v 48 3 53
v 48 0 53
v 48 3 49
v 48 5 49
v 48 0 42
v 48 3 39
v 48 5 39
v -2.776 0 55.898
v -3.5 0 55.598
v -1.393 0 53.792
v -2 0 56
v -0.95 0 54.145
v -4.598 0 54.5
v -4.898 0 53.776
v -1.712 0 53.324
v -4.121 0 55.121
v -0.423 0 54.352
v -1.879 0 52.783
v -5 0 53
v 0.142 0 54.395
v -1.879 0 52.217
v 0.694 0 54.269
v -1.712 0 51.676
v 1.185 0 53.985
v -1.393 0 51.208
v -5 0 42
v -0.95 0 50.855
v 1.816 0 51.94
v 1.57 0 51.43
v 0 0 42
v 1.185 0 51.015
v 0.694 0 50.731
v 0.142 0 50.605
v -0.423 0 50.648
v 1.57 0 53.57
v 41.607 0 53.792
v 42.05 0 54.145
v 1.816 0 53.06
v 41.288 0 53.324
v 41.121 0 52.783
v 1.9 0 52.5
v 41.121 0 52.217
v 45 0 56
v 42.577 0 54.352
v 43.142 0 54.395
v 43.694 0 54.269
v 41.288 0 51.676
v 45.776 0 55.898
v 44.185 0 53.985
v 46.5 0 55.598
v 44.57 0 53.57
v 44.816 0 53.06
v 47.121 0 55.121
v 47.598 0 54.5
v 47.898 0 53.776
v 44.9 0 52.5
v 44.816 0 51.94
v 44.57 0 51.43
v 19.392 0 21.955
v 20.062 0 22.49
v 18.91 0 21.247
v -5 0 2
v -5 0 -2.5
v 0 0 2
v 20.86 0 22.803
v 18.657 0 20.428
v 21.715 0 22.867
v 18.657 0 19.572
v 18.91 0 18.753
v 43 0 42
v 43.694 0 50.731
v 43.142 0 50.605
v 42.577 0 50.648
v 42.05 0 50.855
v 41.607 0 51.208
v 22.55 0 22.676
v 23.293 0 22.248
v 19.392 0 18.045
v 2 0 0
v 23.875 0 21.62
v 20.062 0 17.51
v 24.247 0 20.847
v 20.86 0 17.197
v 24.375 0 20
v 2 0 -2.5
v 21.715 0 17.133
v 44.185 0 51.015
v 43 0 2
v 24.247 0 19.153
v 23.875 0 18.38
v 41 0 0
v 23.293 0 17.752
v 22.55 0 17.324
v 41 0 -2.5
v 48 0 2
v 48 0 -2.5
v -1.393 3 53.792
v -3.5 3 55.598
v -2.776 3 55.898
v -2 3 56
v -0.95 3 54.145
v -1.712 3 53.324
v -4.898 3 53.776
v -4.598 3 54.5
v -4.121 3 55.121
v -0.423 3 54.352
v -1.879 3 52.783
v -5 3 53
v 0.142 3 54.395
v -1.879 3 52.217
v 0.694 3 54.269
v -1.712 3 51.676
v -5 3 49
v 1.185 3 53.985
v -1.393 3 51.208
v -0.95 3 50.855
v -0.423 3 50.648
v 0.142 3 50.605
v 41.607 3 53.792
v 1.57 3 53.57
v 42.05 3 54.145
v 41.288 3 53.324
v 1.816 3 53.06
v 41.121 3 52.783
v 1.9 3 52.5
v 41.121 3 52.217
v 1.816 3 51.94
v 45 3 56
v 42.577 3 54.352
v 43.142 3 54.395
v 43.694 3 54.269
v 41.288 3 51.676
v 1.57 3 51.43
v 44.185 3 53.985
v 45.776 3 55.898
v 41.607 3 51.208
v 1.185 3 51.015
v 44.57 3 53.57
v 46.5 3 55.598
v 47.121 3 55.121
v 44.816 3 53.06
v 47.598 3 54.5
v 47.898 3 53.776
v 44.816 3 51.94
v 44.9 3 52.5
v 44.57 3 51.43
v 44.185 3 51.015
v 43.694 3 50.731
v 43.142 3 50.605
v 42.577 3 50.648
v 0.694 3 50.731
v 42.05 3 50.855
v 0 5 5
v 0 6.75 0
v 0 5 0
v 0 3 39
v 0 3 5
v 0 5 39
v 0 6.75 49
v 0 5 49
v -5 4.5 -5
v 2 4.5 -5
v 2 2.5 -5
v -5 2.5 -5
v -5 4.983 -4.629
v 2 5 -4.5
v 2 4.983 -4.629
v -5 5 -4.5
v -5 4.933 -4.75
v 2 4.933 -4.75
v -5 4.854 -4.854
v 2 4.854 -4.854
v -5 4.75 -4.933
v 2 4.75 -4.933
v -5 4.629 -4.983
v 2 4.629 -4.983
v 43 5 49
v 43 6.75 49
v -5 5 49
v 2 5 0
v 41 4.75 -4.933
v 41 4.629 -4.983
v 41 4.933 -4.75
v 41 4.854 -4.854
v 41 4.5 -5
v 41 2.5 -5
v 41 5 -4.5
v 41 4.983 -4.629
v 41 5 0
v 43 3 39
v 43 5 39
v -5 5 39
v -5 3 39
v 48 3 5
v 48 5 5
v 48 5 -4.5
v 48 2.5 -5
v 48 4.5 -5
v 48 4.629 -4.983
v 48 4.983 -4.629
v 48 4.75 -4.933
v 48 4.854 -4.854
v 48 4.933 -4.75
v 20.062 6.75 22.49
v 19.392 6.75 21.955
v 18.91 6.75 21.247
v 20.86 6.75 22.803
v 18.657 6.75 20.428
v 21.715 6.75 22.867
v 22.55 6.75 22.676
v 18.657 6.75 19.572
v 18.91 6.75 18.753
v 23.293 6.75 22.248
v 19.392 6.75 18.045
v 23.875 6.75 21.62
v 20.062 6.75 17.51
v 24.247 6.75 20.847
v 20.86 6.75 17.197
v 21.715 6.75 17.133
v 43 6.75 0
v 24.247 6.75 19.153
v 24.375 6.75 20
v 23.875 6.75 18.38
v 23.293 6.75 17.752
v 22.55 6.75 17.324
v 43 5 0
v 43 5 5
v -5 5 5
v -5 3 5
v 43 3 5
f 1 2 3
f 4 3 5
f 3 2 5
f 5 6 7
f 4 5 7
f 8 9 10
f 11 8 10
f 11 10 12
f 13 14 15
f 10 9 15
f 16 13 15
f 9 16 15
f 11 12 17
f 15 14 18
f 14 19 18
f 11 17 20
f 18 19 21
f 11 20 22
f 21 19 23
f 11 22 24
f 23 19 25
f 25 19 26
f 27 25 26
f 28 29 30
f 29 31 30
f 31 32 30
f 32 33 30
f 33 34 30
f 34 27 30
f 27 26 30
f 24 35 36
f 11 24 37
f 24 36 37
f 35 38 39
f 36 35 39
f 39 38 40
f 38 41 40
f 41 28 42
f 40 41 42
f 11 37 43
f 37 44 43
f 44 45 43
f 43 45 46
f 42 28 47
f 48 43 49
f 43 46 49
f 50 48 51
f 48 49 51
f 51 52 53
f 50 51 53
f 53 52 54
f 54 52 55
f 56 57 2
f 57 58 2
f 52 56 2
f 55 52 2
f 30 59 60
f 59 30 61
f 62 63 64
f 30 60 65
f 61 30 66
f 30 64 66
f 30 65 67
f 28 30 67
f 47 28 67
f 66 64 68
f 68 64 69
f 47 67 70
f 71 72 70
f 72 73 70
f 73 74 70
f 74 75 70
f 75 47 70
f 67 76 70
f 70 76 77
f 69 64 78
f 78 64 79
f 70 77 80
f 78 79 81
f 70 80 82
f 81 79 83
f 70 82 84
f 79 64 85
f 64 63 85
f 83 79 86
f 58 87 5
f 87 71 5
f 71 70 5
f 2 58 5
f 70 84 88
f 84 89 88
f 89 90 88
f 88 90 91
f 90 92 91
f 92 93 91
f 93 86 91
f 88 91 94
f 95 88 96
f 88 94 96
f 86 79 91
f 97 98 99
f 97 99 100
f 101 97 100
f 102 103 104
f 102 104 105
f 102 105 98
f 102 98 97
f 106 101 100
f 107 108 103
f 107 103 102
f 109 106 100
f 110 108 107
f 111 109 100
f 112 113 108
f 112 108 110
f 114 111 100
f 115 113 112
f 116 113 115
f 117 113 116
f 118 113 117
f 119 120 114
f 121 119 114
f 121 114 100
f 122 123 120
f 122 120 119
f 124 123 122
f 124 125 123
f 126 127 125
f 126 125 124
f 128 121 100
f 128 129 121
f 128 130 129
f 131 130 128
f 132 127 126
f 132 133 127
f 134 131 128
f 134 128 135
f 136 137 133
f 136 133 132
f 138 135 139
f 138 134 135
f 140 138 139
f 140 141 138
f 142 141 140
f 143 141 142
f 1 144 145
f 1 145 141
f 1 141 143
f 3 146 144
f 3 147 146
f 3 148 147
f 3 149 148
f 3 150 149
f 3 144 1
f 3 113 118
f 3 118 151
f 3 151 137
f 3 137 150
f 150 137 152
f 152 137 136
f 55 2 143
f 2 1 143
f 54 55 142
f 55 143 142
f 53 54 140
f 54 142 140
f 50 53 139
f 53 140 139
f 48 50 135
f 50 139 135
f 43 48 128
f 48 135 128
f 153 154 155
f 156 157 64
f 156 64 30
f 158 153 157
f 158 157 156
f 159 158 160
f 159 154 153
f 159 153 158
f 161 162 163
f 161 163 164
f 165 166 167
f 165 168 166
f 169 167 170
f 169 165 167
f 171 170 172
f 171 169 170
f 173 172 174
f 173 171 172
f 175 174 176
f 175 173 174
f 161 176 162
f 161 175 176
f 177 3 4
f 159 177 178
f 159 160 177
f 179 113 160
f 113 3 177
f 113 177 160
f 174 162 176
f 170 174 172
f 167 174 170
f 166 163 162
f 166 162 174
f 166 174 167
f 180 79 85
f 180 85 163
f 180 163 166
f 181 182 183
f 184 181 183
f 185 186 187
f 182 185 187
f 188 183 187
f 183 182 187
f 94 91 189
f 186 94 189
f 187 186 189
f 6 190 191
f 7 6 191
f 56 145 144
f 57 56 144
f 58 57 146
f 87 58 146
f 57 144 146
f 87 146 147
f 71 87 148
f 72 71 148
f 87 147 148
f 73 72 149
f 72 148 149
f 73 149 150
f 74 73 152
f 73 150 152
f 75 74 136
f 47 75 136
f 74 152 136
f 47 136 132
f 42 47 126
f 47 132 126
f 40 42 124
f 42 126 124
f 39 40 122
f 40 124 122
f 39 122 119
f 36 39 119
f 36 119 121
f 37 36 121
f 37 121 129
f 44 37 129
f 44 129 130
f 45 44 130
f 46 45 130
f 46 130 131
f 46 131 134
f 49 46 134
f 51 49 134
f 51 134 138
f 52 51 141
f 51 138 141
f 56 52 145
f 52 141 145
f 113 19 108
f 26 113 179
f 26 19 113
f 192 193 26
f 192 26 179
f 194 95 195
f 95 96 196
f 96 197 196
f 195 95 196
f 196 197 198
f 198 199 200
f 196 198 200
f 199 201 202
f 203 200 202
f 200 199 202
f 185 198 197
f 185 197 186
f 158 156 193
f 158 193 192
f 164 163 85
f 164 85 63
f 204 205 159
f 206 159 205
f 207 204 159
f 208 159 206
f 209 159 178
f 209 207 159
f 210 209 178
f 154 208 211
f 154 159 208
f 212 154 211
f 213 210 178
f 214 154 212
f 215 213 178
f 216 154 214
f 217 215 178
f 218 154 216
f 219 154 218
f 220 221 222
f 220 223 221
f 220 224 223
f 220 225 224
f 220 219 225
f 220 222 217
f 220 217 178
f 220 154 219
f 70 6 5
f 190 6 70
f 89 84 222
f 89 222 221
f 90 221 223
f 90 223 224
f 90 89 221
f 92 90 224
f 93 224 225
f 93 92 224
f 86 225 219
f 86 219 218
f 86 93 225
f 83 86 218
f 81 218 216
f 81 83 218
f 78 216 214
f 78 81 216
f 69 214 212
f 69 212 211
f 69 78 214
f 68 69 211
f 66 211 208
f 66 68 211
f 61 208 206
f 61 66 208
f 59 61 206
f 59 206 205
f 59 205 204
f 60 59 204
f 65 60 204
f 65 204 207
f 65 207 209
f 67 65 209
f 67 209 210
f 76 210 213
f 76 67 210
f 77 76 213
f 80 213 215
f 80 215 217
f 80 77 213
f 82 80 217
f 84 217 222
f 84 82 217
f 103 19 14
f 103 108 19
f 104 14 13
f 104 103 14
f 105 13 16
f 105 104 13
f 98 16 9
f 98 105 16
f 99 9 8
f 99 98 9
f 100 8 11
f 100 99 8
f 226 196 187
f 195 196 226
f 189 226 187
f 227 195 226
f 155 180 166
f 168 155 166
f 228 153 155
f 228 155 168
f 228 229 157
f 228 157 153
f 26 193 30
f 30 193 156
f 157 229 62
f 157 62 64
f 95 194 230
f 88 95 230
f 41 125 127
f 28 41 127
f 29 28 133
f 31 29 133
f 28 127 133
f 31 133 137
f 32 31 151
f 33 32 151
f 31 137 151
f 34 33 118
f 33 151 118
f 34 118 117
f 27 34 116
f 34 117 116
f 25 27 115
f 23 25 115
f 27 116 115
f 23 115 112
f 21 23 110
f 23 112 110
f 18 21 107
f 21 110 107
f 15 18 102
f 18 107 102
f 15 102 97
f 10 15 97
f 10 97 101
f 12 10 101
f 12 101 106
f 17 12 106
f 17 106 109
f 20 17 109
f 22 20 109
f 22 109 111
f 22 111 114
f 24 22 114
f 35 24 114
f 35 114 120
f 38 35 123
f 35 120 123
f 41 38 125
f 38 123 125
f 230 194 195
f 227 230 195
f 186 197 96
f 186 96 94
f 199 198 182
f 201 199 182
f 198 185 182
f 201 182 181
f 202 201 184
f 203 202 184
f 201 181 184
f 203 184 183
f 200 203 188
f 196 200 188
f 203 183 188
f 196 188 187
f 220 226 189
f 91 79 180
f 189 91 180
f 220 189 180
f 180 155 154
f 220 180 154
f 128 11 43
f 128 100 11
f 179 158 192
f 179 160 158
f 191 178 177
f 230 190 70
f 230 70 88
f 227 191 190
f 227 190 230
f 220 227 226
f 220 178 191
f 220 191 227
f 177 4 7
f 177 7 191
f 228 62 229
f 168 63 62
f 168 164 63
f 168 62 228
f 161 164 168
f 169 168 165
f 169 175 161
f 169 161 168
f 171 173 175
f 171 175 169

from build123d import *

# Parameters (mm, degrees)
SKETCH1_W           = 43
SKETCH1_H           = 49
SKETCH1_R           = 2.875
BOSS_EXTRUDE1_DEPTH = 6.75
SKETCH2_W           = 49
SKETCH2_H           = 5
BOSS_EXTRUDE2_DEPTH = 5
SKETCH3_W           = 49
SKETCH3_H           = 5
BOSS_EXTRUDE3_DEPTH = 5
SKETCH4_W           = 7
SKETCH4_H           = 5
BOSS_EXTRUDE4_DEPTH = 5
CHAMFER1_SIZE       = 2.5
FILLET1_R           = 0.5
SKETCH6_W           = 53
SKETCH6_H           = 3
BOSS_EXTRUDE6_DEPTH = 7
SKETCH7_R           = 1.9
CUT_EXTRUDE1_DEPTH  = 3
SKETCH9_W           = 34
SKETCH9_H           = 5
CUT_EXTRUDE2_DEPTH  = 5
SKETCH10_W          = 34
SKETCH10_H          = 5
CUT_EXTRUDE3_DEPTH  = 5
CHAMFER2_SIZE       = 3
FILLET2_R           = 3


with BuildPart() as part:
    # Sketch1 → Boss-Extrude1 (new body)
    with BuildSketch(Plane(origin=(0, 0, 0), x_dir=(1, 0, 0), z_dir=(0, 1, 0))):
        with Locations((21.5, -24.5)):
            Rectangle(SKETCH1_W, SKETCH1_H)
        with Locations((21.5, -20)):
            Circle(SKETCH1_R, mode=Mode.SUBTRACT)
    extrude(amount=BOSS_EXTRUDE1_DEPTH)

    # Sketch2 → Boss-Extrude2 (add)
    with BuildSketch(Plane.ZY):
        with Locations((24.5, 2.5)):
            Rectangle(SKETCH2_W, SKETCH2_H)
    extrude(amount=BOSS_EXTRUDE2_DEPTH)

    # Sketch3 → Boss-Extrude3 (add)
    with BuildSketch(Plane(origin=(43, 0, 0), x_dir=(0, 0, -1), z_dir=(1, 0, 0))):
        with Locations((-24.5, 2.5)):
            Rectangle(SKETCH3_W, SKETCH3_H)
    extrude(amount=BOSS_EXTRUDE3_DEPTH)

    # Sketch4 → Boss-Extrude4 (add)
    with BuildSketch(Plane(origin=(0, 0, 0), x_dir=(-1, 0, 0), z_dir=(0, 0, -1))):
        with Locations((-44.5, 2.5)):
            Rectangle(SKETCH4_W, SKETCH4_H)
        with Locations((1.5, 2.5)):
            Rectangle(SKETCH4_W, SKETCH4_H)
    extrude(amount=BOSS_EXTRUDE4_DEPTH)

    # Chamfer1
    chamfer1_edges = [part.edges().sort_by_distance(p)[0] for p in [
        (44.5, 0, -5),
        (-1.5, 0, -5),
    ]]
    chamfer(chamfer1_edges, length=CHAMFER1_SIZE)

    # Fillet1
    fillet1_edges = [part.edges().sort_by_distance(p)[0] for p in [
        (44.5, 5, -5),
        (-1.5, 5, -5),
    ]]
    fillet(fillet1_edges, radius=FILLET1_R)

    # Sketch6 → Boss-Extrude6 (add)
    with BuildSketch(Plane.XY.offset(49)):
        with Locations((21.5, 1.5)):
            Rectangle(SKETCH6_W, SKETCH6_H)
    extrude(amount=BOSS_EXTRUDE6_DEPTH)

    # Sketch7 → Cut-Extrude1 (cut)
    with BuildSketch(Plane(origin=(0, 3, 0), x_dir=(1, 0, 0), z_dir=(0, 1, 0))):
        with Locations((0, -52.5)):
            Circle(SKETCH7_R)
        with Locations((43, -52.5)):
            Circle(SKETCH7_R)
    extrude(amount=-CUT_EXTRUDE1_DEPTH, mode=Mode.SUBTRACT)

    # Sketch9 → Cut-Extrude2 (cut)
    with BuildSketch(Plane.ZY.offset(5)):
        with Locations((22, 2.5)):
            Rectangle(SKETCH9_W, SKETCH9_H)
    extrude(amount=-CUT_EXTRUDE2_DEPTH, mode=Mode.SUBTRACT)

    # Sketch10 → Cut-Extrude3 (cut)
    with BuildSketch(Plane(origin=(48, 0, 0), x_dir=(0, 0, -1), z_dir=(1, 0, 0))):
        with Locations((-22, 2.5)):
            Rectangle(SKETCH10_W, SKETCH10_H)
    extrude(amount=-CUT_EXTRUDE3_DEPTH, mode=Mode.SUBTRACT)

    # Chamfer2
    chamfer2_edges = [part.edges().sort_by_distance(p)[0] for p in [
        (-2.5, 0, 5),
        (-2.5, 0, 39),
        (45.5, 0, 39),
        (45.5, 0, 5),
    ]]
    chamfer(chamfer2_edges, length=CHAMFER2_SIZE)

    # Fillet2
    fillet2_edges = [part.edges().sort_by_distance(p)[0] for p in [
        (-5, 1.5, 56),
        (48, 1.5, 56),
    ]]
    fillet(fillet2_edges, radius=FILLET2_R)


solid = part.part
